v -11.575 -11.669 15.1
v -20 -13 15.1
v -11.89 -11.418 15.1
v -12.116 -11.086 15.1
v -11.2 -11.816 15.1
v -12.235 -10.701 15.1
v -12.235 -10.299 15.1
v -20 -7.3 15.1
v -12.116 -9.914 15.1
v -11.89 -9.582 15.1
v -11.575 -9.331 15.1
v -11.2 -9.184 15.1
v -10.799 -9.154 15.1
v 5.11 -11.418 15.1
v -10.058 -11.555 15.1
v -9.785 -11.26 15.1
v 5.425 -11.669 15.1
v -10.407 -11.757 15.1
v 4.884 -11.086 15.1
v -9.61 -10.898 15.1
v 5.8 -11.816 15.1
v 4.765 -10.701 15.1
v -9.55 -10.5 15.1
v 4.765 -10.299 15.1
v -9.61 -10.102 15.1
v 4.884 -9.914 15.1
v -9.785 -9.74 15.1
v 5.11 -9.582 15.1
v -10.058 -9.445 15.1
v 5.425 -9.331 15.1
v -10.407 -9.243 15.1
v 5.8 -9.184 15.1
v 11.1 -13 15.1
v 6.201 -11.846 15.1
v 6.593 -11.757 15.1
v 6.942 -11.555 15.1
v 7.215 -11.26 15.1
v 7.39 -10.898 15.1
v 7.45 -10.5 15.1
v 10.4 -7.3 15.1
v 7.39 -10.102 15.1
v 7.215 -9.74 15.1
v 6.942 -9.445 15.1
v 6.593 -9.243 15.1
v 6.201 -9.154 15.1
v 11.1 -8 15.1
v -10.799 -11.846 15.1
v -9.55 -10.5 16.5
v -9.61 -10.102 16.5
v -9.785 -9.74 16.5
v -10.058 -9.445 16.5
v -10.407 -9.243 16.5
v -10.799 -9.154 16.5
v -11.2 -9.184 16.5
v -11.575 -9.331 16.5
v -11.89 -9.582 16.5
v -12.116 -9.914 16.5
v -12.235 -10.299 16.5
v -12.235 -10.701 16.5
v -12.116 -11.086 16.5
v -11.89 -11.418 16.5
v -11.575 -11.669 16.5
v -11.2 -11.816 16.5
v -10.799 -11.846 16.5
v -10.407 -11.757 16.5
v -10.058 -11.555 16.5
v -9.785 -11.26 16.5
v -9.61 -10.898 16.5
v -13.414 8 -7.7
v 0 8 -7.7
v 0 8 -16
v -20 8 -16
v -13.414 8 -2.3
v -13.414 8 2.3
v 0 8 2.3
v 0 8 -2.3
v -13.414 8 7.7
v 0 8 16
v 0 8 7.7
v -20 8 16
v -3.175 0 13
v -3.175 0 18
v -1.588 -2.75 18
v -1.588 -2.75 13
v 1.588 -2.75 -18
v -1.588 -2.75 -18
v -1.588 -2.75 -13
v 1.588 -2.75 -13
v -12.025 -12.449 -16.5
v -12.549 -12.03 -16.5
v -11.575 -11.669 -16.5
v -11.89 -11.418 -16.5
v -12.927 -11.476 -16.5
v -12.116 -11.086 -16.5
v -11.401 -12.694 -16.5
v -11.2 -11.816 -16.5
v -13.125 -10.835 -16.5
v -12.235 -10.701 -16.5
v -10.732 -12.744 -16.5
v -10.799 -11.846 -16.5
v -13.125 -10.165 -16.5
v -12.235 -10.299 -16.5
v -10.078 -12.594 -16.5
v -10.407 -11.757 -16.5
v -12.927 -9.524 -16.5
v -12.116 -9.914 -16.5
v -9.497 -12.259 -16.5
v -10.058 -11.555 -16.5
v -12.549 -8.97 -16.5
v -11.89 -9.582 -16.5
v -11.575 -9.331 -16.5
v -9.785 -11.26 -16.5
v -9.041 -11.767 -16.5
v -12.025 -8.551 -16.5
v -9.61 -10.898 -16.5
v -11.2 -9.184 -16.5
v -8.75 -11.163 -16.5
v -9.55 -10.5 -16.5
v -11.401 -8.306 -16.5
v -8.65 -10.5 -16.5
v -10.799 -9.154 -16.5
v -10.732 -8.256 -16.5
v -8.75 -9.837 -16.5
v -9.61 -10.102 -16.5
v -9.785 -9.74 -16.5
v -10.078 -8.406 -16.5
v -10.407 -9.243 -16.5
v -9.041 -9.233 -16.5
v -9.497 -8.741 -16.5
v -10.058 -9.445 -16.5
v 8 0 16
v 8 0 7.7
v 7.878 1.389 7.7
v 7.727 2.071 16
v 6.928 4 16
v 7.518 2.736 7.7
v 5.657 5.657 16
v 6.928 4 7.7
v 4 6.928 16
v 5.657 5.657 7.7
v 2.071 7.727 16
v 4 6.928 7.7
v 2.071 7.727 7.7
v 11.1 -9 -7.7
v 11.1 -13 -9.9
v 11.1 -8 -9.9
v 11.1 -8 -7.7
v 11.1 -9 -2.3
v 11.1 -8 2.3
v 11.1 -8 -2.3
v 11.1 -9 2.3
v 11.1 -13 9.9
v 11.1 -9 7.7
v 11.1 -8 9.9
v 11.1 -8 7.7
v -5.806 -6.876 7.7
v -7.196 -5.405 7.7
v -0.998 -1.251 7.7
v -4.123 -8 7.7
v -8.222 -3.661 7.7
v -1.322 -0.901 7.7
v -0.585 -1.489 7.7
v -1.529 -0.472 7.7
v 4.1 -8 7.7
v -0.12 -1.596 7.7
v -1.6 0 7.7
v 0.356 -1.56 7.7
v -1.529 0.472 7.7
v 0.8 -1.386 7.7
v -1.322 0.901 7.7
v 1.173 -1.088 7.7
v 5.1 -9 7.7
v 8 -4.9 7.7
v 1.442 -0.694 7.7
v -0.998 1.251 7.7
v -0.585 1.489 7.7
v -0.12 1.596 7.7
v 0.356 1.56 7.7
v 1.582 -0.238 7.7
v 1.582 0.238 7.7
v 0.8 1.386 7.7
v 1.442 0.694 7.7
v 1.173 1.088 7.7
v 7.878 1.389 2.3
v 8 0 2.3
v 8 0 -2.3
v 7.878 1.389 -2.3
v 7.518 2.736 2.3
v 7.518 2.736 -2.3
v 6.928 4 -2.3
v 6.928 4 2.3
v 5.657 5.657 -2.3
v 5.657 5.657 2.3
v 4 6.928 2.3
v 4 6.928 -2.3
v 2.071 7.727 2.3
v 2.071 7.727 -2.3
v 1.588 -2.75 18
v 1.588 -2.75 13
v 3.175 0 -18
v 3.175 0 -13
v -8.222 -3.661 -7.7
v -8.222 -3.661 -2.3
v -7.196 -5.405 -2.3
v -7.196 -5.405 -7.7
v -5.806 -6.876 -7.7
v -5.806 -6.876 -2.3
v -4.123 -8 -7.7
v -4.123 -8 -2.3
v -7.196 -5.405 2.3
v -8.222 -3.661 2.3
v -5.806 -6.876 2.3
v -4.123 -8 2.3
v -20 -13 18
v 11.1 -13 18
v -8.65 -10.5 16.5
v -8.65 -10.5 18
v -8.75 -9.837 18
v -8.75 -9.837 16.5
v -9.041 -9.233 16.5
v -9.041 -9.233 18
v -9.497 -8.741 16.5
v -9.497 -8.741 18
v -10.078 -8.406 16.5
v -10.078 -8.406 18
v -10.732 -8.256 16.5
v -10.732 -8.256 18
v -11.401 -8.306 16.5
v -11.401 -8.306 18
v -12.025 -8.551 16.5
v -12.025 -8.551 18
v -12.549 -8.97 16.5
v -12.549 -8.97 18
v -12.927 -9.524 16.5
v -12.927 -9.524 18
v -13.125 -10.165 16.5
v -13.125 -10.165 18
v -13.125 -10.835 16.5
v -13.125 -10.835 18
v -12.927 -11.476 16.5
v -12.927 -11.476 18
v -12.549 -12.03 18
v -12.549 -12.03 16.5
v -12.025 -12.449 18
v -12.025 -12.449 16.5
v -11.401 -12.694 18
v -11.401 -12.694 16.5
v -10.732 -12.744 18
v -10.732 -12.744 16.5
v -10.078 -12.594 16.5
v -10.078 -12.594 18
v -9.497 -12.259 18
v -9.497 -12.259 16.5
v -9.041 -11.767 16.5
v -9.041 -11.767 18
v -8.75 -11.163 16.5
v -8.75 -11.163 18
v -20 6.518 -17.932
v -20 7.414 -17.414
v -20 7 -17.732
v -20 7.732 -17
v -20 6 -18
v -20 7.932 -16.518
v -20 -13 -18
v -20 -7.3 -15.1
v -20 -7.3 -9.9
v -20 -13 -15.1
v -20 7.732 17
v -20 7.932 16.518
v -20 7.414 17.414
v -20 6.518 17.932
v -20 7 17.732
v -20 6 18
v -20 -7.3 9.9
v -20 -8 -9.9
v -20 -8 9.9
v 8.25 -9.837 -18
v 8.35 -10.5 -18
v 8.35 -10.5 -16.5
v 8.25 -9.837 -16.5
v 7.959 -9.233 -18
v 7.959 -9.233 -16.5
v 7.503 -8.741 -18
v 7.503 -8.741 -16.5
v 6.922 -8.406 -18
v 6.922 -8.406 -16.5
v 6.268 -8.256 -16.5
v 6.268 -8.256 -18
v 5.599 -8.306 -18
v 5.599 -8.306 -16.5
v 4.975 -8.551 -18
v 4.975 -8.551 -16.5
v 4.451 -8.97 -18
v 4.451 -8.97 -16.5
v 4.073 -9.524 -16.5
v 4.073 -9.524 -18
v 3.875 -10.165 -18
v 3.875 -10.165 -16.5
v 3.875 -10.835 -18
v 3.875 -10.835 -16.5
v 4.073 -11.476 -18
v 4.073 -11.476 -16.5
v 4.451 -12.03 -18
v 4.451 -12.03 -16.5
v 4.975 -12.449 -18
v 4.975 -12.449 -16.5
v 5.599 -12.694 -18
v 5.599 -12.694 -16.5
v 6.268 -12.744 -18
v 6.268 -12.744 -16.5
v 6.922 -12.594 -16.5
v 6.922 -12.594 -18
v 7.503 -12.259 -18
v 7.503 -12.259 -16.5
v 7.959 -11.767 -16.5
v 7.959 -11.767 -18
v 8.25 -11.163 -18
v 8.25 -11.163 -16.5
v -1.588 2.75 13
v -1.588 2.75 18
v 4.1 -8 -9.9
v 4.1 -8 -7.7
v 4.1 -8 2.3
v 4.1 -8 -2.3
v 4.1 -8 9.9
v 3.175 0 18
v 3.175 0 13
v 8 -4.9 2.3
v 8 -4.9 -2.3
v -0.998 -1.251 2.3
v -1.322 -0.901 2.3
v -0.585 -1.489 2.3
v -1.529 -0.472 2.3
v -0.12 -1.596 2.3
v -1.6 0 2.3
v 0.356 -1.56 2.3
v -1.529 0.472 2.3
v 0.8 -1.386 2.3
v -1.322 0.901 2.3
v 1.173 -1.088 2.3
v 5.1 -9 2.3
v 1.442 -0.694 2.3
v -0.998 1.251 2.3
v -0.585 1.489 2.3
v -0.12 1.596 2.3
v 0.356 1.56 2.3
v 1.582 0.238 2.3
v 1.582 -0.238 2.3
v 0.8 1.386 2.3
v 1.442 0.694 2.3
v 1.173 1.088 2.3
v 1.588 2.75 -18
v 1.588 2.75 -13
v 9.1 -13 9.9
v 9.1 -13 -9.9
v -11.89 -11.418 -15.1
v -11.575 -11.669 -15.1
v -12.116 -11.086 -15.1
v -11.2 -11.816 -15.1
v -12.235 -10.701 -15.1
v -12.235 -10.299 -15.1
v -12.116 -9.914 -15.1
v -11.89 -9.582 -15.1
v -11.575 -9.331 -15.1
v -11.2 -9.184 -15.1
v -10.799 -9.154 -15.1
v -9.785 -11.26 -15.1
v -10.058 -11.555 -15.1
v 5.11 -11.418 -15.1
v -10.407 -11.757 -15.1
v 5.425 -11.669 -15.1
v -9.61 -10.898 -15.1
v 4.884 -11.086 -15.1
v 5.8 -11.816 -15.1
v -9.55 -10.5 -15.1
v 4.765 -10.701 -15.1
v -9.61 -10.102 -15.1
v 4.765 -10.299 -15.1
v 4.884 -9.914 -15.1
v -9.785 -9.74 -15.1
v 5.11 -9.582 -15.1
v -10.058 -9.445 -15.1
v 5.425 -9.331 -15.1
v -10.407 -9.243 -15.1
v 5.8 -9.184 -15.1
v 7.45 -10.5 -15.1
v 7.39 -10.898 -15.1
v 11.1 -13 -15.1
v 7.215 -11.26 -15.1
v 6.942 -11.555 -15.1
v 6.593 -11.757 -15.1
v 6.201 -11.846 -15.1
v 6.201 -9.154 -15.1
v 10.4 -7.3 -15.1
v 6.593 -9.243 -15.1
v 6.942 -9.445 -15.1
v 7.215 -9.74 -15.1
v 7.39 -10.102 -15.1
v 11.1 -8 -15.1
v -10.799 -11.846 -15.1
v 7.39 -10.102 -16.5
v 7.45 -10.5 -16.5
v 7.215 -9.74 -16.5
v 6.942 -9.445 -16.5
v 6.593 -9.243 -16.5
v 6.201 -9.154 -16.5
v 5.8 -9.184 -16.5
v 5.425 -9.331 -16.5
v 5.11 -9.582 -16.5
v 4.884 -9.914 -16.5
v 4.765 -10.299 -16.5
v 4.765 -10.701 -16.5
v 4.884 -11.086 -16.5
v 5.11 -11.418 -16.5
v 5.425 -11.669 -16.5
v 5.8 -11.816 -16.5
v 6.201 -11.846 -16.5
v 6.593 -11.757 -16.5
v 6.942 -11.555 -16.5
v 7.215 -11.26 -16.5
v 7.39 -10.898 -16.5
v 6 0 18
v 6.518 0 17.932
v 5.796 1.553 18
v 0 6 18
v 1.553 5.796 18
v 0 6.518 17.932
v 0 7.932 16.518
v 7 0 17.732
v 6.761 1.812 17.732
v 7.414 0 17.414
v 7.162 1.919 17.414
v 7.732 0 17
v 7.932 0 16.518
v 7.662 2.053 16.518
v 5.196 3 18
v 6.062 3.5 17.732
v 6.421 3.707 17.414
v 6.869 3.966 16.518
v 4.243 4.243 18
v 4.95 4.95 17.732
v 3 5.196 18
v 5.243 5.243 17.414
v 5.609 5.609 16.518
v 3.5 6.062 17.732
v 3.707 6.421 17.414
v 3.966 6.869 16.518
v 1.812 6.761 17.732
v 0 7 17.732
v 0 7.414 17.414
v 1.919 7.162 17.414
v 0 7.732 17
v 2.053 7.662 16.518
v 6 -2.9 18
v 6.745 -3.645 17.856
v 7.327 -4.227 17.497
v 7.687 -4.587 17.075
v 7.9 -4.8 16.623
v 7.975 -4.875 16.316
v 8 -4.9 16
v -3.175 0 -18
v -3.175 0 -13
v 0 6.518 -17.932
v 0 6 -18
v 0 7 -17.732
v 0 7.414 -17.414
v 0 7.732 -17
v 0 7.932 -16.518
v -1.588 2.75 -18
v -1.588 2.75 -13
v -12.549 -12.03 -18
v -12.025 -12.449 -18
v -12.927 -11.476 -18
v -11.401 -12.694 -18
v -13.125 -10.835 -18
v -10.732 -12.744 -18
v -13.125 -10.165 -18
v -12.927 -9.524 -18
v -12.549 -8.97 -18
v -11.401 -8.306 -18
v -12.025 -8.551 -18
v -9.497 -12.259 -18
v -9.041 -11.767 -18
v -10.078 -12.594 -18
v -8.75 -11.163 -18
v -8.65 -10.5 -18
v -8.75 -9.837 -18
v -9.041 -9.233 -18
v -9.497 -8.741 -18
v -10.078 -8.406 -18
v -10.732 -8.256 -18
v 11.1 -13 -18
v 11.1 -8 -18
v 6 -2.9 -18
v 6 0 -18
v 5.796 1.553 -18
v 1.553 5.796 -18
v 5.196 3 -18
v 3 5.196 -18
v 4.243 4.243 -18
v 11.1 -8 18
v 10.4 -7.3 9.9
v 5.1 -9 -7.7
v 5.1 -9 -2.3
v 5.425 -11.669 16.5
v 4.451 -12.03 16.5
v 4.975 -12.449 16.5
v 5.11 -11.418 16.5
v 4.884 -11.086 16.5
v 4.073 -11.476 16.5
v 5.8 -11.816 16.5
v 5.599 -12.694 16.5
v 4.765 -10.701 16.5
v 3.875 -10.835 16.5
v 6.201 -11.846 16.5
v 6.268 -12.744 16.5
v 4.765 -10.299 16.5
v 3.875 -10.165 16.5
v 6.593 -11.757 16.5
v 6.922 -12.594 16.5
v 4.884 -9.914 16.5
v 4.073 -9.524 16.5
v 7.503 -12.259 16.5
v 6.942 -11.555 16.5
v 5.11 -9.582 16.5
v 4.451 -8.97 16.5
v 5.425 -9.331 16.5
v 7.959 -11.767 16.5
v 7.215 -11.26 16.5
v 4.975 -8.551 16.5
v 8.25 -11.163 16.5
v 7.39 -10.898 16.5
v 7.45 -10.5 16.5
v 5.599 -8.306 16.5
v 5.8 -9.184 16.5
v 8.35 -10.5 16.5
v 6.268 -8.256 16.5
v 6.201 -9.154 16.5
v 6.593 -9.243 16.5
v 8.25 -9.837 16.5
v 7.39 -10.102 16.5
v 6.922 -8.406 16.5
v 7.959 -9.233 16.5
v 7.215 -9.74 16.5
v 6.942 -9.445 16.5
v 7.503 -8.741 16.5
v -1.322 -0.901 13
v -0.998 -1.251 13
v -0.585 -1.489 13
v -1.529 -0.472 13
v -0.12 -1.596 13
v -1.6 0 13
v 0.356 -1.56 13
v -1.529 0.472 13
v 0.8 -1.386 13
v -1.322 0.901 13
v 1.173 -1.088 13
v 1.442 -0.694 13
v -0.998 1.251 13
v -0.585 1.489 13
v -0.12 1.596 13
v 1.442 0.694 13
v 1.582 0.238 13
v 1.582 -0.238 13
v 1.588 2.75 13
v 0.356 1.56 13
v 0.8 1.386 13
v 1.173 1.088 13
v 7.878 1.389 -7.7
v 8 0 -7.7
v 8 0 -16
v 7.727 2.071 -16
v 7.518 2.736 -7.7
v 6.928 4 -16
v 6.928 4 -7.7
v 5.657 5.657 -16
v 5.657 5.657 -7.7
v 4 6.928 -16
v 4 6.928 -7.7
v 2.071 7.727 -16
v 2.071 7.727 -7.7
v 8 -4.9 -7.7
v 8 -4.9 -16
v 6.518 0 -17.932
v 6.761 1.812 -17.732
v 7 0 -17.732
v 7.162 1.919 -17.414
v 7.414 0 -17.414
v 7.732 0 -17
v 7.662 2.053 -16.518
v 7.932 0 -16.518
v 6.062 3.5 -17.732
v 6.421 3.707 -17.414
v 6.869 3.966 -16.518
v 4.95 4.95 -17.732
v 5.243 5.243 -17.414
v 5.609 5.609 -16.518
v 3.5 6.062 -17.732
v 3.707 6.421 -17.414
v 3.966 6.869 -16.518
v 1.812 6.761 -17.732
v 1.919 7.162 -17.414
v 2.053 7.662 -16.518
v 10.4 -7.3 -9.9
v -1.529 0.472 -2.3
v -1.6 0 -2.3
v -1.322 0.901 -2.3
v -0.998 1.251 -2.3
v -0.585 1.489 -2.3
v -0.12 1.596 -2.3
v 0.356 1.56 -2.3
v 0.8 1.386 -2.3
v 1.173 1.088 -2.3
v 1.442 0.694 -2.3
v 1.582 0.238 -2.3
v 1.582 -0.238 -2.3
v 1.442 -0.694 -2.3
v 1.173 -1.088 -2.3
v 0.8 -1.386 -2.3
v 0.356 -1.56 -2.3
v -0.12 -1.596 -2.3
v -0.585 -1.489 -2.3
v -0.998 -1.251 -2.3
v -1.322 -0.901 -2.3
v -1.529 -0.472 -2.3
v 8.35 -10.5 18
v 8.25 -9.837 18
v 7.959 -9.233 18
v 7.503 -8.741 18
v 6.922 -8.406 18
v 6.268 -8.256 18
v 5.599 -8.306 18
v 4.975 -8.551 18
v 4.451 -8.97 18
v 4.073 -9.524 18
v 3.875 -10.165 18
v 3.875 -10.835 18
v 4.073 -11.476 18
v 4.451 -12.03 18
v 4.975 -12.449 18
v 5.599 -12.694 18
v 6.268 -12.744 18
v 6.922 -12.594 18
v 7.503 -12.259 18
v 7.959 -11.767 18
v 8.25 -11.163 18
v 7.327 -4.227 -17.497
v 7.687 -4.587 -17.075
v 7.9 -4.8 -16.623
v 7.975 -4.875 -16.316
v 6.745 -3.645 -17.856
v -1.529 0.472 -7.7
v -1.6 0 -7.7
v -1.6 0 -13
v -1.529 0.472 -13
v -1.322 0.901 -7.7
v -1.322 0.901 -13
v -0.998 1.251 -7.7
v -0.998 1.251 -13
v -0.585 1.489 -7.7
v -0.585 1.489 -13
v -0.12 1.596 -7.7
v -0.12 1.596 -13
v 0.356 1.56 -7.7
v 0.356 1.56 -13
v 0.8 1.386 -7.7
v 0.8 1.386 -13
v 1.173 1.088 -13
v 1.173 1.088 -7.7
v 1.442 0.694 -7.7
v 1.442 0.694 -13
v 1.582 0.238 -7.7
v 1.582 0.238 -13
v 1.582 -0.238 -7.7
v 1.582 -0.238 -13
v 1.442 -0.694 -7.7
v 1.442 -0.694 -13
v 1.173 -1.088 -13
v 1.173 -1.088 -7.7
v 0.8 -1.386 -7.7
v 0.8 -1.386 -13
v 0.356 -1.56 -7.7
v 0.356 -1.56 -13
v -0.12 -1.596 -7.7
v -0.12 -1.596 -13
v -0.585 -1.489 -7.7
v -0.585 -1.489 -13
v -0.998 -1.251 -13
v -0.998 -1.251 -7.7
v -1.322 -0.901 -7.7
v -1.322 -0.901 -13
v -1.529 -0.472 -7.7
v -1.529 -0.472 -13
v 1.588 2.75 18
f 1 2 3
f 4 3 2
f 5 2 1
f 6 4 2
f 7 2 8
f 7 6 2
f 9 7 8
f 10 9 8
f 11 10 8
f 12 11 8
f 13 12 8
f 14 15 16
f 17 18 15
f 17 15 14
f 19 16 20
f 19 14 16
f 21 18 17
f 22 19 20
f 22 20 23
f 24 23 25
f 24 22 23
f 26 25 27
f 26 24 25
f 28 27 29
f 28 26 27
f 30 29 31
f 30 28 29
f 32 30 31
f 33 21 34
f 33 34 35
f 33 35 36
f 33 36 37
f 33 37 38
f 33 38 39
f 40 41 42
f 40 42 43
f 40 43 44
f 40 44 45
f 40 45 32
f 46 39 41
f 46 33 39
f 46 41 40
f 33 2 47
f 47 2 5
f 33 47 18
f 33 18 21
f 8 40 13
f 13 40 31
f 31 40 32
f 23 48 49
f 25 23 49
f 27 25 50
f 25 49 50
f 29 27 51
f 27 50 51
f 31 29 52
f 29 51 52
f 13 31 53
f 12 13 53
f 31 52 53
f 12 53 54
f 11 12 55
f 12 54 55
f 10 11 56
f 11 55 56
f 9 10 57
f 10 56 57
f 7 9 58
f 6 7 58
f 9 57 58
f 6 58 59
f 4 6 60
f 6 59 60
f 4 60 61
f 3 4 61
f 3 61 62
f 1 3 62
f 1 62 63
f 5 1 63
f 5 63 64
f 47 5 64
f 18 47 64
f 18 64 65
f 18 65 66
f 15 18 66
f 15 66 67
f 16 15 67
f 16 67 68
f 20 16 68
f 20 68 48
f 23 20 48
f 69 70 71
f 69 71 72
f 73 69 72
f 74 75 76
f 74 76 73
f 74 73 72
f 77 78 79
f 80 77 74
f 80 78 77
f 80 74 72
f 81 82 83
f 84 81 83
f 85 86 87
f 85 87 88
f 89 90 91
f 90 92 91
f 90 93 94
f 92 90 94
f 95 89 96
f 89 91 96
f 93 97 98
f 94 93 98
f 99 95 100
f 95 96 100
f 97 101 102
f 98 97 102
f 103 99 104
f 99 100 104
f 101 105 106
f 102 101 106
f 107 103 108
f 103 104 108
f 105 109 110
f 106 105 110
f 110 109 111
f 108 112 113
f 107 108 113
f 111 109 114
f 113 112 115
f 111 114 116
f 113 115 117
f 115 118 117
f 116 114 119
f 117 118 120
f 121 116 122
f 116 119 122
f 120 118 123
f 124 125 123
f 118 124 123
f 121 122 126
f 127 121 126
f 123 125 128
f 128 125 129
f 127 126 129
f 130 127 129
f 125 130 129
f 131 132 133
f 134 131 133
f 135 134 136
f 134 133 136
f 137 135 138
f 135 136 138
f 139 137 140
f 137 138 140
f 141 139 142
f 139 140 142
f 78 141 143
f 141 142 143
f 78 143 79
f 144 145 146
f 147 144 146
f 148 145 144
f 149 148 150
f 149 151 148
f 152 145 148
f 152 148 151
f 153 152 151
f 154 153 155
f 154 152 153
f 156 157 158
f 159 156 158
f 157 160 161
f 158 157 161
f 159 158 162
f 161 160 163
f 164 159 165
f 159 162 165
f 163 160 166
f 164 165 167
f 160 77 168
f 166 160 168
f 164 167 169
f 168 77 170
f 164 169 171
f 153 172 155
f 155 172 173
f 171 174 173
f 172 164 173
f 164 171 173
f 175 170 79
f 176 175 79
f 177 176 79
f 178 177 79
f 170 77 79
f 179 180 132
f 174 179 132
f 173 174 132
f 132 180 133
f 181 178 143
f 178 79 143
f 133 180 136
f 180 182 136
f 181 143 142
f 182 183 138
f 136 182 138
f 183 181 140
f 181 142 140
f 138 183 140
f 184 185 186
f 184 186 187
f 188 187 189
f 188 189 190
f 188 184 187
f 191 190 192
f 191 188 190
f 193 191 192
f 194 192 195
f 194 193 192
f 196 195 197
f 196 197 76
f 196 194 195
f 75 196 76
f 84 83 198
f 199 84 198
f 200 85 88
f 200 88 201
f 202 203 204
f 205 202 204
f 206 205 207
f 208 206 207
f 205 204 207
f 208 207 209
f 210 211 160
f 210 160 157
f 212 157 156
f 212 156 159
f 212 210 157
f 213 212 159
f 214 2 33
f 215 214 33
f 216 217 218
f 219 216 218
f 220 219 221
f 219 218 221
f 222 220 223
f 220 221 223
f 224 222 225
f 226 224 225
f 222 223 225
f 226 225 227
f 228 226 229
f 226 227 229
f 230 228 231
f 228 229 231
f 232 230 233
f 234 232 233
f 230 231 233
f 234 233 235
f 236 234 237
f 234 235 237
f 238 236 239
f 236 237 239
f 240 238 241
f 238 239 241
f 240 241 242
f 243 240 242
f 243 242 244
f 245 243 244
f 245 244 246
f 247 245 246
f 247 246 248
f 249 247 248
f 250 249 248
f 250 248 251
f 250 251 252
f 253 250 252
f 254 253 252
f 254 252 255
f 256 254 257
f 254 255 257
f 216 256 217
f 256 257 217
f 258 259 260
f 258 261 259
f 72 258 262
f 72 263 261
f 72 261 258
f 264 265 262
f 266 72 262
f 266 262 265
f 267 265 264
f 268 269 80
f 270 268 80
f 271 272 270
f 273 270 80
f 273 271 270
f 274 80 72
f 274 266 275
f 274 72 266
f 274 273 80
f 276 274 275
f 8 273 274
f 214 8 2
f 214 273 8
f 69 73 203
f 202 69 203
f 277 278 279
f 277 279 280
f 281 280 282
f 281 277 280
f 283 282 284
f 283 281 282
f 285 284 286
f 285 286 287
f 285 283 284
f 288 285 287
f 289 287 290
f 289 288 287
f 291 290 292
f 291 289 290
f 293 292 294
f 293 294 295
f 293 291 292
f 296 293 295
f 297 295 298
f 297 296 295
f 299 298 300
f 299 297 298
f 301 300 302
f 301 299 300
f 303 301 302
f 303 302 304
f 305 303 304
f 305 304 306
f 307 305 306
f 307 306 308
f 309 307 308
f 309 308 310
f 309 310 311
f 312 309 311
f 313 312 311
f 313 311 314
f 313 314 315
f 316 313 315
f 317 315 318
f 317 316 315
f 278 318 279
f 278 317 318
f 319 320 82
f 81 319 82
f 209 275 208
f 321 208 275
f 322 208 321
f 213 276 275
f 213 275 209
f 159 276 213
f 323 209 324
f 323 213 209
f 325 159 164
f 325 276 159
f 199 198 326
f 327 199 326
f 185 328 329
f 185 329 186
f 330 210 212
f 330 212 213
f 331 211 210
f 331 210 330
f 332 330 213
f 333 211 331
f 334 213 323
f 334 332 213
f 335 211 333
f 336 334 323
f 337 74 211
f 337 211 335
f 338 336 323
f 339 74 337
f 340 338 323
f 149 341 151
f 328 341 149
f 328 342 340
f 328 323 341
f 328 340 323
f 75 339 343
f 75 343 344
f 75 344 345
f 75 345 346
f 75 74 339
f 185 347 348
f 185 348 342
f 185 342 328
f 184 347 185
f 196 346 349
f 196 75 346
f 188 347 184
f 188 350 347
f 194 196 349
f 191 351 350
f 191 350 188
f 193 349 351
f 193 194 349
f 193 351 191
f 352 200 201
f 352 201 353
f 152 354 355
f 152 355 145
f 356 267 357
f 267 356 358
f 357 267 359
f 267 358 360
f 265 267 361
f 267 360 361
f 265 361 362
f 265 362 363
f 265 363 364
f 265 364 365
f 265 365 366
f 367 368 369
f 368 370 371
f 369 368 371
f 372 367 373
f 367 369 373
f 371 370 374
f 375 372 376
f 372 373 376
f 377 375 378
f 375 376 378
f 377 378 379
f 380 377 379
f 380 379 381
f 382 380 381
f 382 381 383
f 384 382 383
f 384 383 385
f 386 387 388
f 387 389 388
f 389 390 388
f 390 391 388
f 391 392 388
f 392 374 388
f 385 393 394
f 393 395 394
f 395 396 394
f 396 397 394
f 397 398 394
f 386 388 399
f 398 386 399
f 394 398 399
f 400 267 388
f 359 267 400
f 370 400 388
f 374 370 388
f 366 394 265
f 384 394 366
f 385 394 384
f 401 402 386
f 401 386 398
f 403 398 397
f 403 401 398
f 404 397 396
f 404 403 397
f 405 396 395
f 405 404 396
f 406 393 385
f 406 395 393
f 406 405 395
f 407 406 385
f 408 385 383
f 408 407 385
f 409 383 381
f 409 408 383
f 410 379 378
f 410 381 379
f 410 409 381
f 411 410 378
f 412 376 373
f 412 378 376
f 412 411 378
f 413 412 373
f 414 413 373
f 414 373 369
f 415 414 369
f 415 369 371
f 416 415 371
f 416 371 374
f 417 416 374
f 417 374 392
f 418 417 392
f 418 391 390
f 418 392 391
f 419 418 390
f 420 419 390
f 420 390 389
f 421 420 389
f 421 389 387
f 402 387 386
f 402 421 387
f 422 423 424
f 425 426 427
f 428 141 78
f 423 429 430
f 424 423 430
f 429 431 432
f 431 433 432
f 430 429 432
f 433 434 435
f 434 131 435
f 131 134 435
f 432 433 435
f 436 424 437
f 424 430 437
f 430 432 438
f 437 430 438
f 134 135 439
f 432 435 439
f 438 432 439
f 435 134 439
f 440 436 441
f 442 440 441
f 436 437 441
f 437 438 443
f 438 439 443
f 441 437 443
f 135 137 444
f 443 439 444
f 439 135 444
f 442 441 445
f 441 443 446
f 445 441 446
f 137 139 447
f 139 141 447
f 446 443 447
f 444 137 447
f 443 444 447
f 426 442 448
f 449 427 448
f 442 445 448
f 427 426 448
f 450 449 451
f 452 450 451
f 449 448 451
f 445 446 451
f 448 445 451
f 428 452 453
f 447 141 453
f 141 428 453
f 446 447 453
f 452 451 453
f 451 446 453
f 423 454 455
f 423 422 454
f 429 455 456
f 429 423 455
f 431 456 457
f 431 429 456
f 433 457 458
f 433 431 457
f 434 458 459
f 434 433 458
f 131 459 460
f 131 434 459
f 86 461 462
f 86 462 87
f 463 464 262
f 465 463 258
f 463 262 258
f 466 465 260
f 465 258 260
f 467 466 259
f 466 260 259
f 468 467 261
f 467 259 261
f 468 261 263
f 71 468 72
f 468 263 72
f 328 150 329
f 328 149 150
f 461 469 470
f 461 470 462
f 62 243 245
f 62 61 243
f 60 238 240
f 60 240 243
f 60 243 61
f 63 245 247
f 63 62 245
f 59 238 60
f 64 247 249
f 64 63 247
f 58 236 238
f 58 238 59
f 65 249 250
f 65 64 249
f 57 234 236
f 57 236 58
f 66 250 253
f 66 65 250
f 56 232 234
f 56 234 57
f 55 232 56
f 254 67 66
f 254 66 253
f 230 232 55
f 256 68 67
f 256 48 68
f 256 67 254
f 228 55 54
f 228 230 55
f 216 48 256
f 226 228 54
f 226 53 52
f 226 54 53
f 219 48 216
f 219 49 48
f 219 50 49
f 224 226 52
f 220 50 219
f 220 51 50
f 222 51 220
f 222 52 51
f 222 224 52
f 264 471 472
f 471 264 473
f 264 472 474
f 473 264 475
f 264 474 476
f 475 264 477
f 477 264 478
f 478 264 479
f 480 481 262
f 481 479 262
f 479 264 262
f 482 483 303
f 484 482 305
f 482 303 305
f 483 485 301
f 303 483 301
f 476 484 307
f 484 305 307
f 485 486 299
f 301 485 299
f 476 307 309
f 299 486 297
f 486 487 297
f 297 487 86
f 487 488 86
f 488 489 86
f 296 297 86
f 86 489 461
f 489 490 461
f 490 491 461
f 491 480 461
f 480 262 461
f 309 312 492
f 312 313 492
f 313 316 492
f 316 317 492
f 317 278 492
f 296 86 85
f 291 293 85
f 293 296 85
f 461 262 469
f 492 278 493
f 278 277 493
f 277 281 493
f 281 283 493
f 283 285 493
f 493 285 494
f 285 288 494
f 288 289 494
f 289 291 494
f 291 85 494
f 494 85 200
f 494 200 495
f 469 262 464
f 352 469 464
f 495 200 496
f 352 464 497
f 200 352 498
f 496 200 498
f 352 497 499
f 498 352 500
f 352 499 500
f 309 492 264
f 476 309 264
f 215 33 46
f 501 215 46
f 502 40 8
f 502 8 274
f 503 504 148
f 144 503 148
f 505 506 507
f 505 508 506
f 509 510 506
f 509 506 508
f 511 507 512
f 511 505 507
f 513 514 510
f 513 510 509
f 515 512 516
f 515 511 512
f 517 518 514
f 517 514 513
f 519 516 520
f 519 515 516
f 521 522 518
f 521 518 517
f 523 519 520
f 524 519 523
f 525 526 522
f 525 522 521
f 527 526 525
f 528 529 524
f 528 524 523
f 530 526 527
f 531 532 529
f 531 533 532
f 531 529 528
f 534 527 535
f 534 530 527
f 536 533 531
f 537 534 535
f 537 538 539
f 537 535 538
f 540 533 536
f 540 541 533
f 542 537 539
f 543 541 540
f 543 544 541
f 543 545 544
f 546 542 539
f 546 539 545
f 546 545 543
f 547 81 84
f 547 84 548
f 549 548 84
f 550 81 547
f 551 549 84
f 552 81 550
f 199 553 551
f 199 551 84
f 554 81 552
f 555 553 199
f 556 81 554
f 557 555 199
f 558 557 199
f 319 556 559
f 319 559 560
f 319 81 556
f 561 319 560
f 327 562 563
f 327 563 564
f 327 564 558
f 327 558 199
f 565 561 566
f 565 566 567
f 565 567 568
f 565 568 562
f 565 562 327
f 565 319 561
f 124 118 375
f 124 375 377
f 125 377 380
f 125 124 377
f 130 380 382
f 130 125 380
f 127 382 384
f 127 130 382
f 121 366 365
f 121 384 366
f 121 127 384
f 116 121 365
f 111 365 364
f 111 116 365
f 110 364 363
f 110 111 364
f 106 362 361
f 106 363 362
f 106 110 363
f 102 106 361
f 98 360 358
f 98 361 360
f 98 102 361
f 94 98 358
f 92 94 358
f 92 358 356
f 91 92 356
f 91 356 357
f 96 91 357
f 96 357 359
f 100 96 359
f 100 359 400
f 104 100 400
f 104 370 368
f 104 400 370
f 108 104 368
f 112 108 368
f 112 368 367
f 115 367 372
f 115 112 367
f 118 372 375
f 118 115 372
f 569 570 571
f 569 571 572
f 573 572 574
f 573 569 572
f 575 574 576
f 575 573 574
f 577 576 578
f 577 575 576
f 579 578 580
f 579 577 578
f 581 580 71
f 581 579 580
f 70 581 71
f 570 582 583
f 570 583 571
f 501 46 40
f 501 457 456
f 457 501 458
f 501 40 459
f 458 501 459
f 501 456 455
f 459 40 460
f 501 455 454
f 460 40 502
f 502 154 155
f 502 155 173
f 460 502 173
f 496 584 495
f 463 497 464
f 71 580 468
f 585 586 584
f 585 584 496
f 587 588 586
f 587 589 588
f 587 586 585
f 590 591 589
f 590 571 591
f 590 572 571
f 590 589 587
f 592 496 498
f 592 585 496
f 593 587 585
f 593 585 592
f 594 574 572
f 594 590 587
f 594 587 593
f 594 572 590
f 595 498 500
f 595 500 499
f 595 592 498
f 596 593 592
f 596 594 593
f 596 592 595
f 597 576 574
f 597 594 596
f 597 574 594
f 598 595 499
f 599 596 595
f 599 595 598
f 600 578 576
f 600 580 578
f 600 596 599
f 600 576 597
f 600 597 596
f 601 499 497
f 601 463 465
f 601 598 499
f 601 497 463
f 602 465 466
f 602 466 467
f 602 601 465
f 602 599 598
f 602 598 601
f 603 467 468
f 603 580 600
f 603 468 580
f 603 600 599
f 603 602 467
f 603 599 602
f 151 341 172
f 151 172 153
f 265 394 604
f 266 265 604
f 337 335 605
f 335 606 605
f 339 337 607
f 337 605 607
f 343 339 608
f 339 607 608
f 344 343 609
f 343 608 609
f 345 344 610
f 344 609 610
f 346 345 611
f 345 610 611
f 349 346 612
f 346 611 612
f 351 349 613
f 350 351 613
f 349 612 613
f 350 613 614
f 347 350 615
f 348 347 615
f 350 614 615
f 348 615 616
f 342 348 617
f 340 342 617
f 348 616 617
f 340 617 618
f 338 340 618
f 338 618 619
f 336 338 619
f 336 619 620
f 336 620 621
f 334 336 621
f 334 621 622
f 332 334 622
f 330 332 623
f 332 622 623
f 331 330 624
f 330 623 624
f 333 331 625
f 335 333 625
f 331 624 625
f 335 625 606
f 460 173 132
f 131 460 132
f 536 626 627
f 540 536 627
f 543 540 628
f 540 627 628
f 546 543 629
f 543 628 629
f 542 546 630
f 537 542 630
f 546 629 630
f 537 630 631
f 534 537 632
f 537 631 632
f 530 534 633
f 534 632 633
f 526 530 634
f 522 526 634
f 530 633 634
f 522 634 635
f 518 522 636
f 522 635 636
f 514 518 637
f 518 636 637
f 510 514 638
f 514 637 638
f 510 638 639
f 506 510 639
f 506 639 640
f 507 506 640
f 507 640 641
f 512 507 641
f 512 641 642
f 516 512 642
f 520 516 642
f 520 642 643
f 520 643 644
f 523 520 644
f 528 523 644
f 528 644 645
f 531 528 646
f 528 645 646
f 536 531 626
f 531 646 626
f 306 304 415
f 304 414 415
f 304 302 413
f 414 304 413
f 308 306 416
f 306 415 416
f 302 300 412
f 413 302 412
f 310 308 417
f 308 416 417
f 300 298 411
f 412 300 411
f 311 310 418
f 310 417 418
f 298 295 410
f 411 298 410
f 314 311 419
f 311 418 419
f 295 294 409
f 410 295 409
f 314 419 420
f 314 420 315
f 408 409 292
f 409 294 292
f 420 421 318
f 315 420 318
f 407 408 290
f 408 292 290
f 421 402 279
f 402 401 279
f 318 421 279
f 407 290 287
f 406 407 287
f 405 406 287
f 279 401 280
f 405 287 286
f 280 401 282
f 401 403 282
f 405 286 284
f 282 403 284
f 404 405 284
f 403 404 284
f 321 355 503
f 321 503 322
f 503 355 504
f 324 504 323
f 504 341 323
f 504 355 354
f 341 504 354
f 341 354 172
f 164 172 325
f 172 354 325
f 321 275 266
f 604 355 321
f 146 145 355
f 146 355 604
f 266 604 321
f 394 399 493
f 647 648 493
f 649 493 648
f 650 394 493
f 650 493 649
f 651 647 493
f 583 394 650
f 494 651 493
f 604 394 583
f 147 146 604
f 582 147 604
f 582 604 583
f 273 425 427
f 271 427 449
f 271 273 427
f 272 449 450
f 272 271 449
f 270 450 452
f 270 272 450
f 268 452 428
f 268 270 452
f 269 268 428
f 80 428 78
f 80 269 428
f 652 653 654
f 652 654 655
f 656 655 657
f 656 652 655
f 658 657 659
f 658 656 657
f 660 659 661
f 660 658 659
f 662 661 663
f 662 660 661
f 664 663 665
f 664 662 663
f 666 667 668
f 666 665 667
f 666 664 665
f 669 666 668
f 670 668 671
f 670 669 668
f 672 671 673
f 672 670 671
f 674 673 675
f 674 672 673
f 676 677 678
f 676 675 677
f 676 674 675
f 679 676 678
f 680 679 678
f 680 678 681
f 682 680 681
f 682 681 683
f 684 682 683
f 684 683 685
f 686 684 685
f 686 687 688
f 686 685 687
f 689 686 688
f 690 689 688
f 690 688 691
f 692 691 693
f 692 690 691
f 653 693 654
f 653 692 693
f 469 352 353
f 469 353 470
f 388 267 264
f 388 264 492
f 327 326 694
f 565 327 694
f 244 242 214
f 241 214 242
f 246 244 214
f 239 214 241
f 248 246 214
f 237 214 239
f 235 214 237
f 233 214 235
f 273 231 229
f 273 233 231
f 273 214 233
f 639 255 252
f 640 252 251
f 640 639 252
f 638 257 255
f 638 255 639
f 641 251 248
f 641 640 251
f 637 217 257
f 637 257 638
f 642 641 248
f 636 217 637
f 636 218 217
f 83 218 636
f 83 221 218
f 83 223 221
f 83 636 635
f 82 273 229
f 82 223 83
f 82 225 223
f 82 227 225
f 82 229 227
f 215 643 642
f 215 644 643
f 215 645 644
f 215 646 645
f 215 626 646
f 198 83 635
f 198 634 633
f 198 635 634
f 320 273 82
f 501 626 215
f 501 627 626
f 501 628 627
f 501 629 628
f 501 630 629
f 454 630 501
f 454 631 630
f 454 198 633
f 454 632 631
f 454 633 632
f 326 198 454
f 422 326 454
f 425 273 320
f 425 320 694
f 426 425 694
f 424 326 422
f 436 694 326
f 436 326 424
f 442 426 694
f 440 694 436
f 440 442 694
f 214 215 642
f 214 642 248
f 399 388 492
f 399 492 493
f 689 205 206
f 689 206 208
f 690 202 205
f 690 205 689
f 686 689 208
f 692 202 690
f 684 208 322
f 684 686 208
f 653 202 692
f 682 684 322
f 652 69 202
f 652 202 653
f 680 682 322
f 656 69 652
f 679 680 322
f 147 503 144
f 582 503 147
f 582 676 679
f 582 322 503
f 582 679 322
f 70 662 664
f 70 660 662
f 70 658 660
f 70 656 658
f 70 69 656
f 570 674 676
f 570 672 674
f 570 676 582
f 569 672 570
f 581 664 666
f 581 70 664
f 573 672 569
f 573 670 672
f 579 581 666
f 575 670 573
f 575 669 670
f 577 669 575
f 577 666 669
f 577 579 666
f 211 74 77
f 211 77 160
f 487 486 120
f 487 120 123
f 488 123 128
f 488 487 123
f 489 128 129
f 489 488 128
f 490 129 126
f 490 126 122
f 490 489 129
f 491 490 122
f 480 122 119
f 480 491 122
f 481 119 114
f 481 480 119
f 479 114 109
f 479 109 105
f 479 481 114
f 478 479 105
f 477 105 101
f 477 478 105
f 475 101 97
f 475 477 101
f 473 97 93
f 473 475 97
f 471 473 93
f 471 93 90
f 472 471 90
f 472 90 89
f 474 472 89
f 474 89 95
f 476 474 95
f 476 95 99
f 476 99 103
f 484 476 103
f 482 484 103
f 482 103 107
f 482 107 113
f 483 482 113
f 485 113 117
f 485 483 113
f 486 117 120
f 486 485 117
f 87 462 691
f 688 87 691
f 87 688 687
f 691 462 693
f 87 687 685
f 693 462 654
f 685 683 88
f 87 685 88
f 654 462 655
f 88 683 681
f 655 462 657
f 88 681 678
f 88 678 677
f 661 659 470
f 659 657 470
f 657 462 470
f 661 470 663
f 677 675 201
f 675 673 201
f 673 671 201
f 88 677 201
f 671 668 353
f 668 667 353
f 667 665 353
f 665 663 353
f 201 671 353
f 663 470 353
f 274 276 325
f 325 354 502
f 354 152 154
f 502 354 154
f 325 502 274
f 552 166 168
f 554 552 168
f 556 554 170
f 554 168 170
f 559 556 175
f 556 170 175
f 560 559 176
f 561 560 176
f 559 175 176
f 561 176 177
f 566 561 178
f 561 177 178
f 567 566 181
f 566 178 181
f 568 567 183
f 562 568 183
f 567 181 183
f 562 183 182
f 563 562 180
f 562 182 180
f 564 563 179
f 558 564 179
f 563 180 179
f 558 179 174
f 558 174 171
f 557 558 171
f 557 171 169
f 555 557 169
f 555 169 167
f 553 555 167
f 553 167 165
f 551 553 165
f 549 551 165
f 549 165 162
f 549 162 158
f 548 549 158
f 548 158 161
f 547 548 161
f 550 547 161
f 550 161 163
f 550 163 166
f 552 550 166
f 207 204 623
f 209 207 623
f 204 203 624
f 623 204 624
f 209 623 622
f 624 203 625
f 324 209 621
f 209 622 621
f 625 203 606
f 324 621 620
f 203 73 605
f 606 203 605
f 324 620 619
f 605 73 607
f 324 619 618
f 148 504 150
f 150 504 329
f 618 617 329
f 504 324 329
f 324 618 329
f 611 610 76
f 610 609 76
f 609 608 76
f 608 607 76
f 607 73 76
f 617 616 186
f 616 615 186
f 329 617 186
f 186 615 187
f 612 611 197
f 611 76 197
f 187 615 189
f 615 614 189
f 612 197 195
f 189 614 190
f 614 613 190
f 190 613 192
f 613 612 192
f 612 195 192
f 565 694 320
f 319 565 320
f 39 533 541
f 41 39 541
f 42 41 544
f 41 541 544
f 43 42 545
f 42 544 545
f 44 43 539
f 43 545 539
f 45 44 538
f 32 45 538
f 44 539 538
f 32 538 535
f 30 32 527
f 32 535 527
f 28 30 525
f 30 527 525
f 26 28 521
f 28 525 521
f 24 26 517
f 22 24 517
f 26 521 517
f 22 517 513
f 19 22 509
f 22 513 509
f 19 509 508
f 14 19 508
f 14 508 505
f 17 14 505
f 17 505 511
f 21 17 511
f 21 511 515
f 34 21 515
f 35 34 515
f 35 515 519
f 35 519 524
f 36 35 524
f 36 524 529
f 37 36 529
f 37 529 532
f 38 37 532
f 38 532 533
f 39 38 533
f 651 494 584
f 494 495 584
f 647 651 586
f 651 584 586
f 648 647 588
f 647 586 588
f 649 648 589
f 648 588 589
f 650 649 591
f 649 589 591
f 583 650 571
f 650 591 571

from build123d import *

# Parameters (mm, degrees)
BOSS_EXTRUDE1_DEPTH   = 18
CROQUIS2_R            = 1.35
CORTAR_EXTRUIR2_DEPTH = 5
SKETCH3_R             = 2.25
CUT_EXTRUDE1_DEPTH    = 1.5
SKETCH5_W             = 5.2
SKETCH5_H             = 5.7
CUT_EXTRUDE2_DEPTH    = 39.212694226
CUT_EXTRUDE3_START    = -15.7
CUT_EXTRUDE3_DEPTH    = 5.4
CROQUIS1_R            = 1.6
CORTAR_EXTRUIR1_DEPTH = 30.883105595
CUT_EXTRUDE7_DEPTH    = 5
SKETCH7_W             = 24.1
SKETCH7_H             = 19.8
CUT_EXTRUDE4_DEPTH    = 5
FILLET5_R             = 2
CHAFL_N1_SIZE         = 5


with BuildPart() as part:
    # Sketch1 → Boss-Extrude1 (new body)
    with BuildSketch(Plane.XY):
        with BuildLine():
            Line((-20, 5.553828843), (-20, -8))
            Line((-20, -8), (-20, -13))
            Line((-20, -13), (11.1, -13))
            Line((11.1, -13), (11.1, -8))
            Line((11.1, -8), (8, -4.9))
            Line((8, -4.9), (8, 0))
            ThreePointArc((8, 0), (5.656854249, 5.656854249), (0, 8))
            Line((0, 8), (-20, 8))
            Line((-20, 8), (-20, 5.553828843))
        make_face()
    boss_extrude1 = extrude(amount=BOSS_EXTRUDE1_DEPTH)

    # Croquis2 → Cortar-Extruir2 (cut)
    with BuildSketch(Plane.XY.offset(18)):
        with Locations((-10.9, -10.5)):
            Circle(CROQUIS2_R)
        with Locations((6.1, -10.5)):
            Circle(CROQUIS2_R)
    cortar_extruir2 = extrude(amount=-CORTAR_EXTRUIR2_DEPTH, mode=Mode.SUBTRACT)

    # Sketch3 → Cut-Extrude1 (cut)
    with BuildSketch(Plane.XY.offset(18)):
        with Locations((-10.9, -10.5)):
            Circle(SKETCH3_R)
        with Locations((6.1, -10.5)):
            Circle(SKETCH3_R)
    cut_extrude1 = extrude(amount=-CUT_EXTRUDE1_DEPTH, mode=Mode.SUBTRACT)

    # Sketch5 → Cut-Extrude2 (cut, through all)
    with BuildSketch(Plane(origin=(11.1, 0, 0), x_dir=(0, 0, -1), z_dir=(1, 0, 0))):
        with Locations((-12.5, -10.15)):
            Rectangle(SKETCH5_W, SKETCH5_H)
    cut_extrude2 = extrude(amount=-CUT_EXTRUDE2_DEPTH, mode=Mode.SUBTRACT)

    # Sketch6 → Cut-Extrude3 (cut)
    with BuildSketch(Plane.XY.offset(18).offset(CUT_EXTRUDE3_START)):
        with BuildLine():
            Line((-13.413555989, 8), (-8.221909119, -3.660629788))
            ThreePointArc((-8.221909119, -3.660629788), (-4.901751315, -7.548035112), (0, -9))
            Line((0, -9), (14.43375673, -9))
            Line((14.43375673, -9), (6.92820323, 4))
            ThreePointArc((6.92820323, 4), (4, 6.92820323), (0, 8))
            Line((0, 8), (-13.413555989, 8))
        make_face()
    cut_extrude3 = extrude(amount=CUT_EXTRUDE3_DEPTH, mode=Mode.SUBTRACT)

    # Croquis1 → Cortar-Extruir1 (cut, through all)
    with BuildSketch(Plane(origin=(0, 0, 0), x_dir=(-1, 0, 0), z_dir=(0, 0, -1))):
        Circle(CROQUIS1_R)
    cortar_extruir1 = extrude(amount=-CORTAR_EXTRUIR1_DEPTH, mode=Mode.SUBTRACT)

    # Sketch10 → Cut-Extrude7 (cut)
    with BuildSketch(Plane.XY.offset(18)):
        Polygon((3.175426481, 0), (1.58771324, 2.75), (-1.58771324, 2.75), (-3.175426481, 0), (-1.58771324, -2.75), (1.58771324, -2.75), align=None)
    cut_extrude7 = extrude(amount=-CUT_EXTRUDE7_DEPTH, mode=Mode.SUBTRACT)

    # Mirror1: Boss-Extrude1, Cortar-Extruir2, Cut-Extrude1, Cut-Extrude2, Cut-Extrude3, Cortar-Extruir1, Cut-Extrude7 across plane
    add(boss_extrude1.mirror(Plane(origin=(0, 0, 0), x_dir=(1, 0, 0), z_dir=(0, 0, -1))))
    add(cortar_extruir2.mirror(Plane(origin=(0, 0, 0), x_dir=(1, 0, 0), z_dir=(0, 0, -1))), mode=Mode.SUBTRACT)
    add(cut_extrude1.mirror(Plane(origin=(0, 0, 0), x_dir=(1, 0, 0), z_dir=(0, 0, -1))), mode=Mode.SUBTRACT)
    add(cut_extrude2.mirror(Plane(origin=(0, 0, 0), x_dir=(1, 0, 0), z_dir=(0, 0, -1))), mode=Mode.SUBTRACT)
    add(cut_extrude3.mirror(Plane(origin=(0, 0, 0), x_dir=(1, 0, 0), z_dir=(0, 0, -1))), mode=Mode.SUBTRACT)
    add(cortar_extruir1.mirror(Plane(origin=(0, 0, 0), x_dir=(1, 0, 0), z_dir=(0, 0, -1))), mode=Mode.SUBTRACT)
    add(cut_extrude7.mirror(Plane(origin=(0, 0, 0), x_dir=(1, 0, 0), z_dir=(0, 0, -1))), mode=Mode.SUBTRACT)

    # Sketch7 → Cut-Extrude4 (cut)
    with BuildSketch(Plane.XZ.offset(13)):
        with Locations((-7.95, 0)):
            Rectangle(SKETCH7_W, SKETCH7_H)
    extrude(amount=-CUT_EXTRUDE4_DEPTH, mode=Mode.SUBTRACT)

    # Fillet5
    fillet5_edges = [part.edges().sort_by_distance(p)[0] for p in [
        (5.656854249, 5.656854249, 18),
        (-10, 8, 18),
        (-10, 8, -18),
        (5.656854249, 5.656854249, -18),
        (8, -2.45, -18),
        (8, -2.45, 18),
    ]]
    fillet(fillet5_edges, radius=FILLET5_R)

    # Chaflán1
    # the kernel refuses this chamfer: 5 mm, written as the material it takes off along each edge
    with BuildSketch(Plane(origin=(4.1, -13, 22.75841494), x_dir=(0.9996219169112968, -0.027495876610586317, 0), z_dir=(0, 0, -1))) as chafl_n1_piece_1_section:
        Polygon((CHAFL_N1_SIZE * 0.999621916911, -CHAFL_N1_SIZE * 0.0274958766106), (-CHAFL_N1_SIZE * 0.0274958766106, -CHAFL_N1_SIZE * 0.999621916911), (0, 0), align=None)
    chafl_n1_piece_1 = extrude(amount=45.51682988, mode=Mode.PRIVATE)
    chafl_n1_piece_1 = split(chafl_n1_piece_1, bisect_by=Plane(origin=(8.49756634, -12.423659296, -15.1), z_dir=(0, 0, 1)), keep=Keep.TOP, mode=Mode.PRIVATE)
    chafl_n1_piece_1 = split(chafl_n1_piece_1, bisect_by=Plane(origin=(8.49756634, -12.423659296, 15.1), z_dir=(0, 0, -1)), keep=Keep.TOP, mode=Mode.PRIVATE)
    add(chafl_n1_piece_1, mode=Mode.SUBTRACT)


solid = part.part
